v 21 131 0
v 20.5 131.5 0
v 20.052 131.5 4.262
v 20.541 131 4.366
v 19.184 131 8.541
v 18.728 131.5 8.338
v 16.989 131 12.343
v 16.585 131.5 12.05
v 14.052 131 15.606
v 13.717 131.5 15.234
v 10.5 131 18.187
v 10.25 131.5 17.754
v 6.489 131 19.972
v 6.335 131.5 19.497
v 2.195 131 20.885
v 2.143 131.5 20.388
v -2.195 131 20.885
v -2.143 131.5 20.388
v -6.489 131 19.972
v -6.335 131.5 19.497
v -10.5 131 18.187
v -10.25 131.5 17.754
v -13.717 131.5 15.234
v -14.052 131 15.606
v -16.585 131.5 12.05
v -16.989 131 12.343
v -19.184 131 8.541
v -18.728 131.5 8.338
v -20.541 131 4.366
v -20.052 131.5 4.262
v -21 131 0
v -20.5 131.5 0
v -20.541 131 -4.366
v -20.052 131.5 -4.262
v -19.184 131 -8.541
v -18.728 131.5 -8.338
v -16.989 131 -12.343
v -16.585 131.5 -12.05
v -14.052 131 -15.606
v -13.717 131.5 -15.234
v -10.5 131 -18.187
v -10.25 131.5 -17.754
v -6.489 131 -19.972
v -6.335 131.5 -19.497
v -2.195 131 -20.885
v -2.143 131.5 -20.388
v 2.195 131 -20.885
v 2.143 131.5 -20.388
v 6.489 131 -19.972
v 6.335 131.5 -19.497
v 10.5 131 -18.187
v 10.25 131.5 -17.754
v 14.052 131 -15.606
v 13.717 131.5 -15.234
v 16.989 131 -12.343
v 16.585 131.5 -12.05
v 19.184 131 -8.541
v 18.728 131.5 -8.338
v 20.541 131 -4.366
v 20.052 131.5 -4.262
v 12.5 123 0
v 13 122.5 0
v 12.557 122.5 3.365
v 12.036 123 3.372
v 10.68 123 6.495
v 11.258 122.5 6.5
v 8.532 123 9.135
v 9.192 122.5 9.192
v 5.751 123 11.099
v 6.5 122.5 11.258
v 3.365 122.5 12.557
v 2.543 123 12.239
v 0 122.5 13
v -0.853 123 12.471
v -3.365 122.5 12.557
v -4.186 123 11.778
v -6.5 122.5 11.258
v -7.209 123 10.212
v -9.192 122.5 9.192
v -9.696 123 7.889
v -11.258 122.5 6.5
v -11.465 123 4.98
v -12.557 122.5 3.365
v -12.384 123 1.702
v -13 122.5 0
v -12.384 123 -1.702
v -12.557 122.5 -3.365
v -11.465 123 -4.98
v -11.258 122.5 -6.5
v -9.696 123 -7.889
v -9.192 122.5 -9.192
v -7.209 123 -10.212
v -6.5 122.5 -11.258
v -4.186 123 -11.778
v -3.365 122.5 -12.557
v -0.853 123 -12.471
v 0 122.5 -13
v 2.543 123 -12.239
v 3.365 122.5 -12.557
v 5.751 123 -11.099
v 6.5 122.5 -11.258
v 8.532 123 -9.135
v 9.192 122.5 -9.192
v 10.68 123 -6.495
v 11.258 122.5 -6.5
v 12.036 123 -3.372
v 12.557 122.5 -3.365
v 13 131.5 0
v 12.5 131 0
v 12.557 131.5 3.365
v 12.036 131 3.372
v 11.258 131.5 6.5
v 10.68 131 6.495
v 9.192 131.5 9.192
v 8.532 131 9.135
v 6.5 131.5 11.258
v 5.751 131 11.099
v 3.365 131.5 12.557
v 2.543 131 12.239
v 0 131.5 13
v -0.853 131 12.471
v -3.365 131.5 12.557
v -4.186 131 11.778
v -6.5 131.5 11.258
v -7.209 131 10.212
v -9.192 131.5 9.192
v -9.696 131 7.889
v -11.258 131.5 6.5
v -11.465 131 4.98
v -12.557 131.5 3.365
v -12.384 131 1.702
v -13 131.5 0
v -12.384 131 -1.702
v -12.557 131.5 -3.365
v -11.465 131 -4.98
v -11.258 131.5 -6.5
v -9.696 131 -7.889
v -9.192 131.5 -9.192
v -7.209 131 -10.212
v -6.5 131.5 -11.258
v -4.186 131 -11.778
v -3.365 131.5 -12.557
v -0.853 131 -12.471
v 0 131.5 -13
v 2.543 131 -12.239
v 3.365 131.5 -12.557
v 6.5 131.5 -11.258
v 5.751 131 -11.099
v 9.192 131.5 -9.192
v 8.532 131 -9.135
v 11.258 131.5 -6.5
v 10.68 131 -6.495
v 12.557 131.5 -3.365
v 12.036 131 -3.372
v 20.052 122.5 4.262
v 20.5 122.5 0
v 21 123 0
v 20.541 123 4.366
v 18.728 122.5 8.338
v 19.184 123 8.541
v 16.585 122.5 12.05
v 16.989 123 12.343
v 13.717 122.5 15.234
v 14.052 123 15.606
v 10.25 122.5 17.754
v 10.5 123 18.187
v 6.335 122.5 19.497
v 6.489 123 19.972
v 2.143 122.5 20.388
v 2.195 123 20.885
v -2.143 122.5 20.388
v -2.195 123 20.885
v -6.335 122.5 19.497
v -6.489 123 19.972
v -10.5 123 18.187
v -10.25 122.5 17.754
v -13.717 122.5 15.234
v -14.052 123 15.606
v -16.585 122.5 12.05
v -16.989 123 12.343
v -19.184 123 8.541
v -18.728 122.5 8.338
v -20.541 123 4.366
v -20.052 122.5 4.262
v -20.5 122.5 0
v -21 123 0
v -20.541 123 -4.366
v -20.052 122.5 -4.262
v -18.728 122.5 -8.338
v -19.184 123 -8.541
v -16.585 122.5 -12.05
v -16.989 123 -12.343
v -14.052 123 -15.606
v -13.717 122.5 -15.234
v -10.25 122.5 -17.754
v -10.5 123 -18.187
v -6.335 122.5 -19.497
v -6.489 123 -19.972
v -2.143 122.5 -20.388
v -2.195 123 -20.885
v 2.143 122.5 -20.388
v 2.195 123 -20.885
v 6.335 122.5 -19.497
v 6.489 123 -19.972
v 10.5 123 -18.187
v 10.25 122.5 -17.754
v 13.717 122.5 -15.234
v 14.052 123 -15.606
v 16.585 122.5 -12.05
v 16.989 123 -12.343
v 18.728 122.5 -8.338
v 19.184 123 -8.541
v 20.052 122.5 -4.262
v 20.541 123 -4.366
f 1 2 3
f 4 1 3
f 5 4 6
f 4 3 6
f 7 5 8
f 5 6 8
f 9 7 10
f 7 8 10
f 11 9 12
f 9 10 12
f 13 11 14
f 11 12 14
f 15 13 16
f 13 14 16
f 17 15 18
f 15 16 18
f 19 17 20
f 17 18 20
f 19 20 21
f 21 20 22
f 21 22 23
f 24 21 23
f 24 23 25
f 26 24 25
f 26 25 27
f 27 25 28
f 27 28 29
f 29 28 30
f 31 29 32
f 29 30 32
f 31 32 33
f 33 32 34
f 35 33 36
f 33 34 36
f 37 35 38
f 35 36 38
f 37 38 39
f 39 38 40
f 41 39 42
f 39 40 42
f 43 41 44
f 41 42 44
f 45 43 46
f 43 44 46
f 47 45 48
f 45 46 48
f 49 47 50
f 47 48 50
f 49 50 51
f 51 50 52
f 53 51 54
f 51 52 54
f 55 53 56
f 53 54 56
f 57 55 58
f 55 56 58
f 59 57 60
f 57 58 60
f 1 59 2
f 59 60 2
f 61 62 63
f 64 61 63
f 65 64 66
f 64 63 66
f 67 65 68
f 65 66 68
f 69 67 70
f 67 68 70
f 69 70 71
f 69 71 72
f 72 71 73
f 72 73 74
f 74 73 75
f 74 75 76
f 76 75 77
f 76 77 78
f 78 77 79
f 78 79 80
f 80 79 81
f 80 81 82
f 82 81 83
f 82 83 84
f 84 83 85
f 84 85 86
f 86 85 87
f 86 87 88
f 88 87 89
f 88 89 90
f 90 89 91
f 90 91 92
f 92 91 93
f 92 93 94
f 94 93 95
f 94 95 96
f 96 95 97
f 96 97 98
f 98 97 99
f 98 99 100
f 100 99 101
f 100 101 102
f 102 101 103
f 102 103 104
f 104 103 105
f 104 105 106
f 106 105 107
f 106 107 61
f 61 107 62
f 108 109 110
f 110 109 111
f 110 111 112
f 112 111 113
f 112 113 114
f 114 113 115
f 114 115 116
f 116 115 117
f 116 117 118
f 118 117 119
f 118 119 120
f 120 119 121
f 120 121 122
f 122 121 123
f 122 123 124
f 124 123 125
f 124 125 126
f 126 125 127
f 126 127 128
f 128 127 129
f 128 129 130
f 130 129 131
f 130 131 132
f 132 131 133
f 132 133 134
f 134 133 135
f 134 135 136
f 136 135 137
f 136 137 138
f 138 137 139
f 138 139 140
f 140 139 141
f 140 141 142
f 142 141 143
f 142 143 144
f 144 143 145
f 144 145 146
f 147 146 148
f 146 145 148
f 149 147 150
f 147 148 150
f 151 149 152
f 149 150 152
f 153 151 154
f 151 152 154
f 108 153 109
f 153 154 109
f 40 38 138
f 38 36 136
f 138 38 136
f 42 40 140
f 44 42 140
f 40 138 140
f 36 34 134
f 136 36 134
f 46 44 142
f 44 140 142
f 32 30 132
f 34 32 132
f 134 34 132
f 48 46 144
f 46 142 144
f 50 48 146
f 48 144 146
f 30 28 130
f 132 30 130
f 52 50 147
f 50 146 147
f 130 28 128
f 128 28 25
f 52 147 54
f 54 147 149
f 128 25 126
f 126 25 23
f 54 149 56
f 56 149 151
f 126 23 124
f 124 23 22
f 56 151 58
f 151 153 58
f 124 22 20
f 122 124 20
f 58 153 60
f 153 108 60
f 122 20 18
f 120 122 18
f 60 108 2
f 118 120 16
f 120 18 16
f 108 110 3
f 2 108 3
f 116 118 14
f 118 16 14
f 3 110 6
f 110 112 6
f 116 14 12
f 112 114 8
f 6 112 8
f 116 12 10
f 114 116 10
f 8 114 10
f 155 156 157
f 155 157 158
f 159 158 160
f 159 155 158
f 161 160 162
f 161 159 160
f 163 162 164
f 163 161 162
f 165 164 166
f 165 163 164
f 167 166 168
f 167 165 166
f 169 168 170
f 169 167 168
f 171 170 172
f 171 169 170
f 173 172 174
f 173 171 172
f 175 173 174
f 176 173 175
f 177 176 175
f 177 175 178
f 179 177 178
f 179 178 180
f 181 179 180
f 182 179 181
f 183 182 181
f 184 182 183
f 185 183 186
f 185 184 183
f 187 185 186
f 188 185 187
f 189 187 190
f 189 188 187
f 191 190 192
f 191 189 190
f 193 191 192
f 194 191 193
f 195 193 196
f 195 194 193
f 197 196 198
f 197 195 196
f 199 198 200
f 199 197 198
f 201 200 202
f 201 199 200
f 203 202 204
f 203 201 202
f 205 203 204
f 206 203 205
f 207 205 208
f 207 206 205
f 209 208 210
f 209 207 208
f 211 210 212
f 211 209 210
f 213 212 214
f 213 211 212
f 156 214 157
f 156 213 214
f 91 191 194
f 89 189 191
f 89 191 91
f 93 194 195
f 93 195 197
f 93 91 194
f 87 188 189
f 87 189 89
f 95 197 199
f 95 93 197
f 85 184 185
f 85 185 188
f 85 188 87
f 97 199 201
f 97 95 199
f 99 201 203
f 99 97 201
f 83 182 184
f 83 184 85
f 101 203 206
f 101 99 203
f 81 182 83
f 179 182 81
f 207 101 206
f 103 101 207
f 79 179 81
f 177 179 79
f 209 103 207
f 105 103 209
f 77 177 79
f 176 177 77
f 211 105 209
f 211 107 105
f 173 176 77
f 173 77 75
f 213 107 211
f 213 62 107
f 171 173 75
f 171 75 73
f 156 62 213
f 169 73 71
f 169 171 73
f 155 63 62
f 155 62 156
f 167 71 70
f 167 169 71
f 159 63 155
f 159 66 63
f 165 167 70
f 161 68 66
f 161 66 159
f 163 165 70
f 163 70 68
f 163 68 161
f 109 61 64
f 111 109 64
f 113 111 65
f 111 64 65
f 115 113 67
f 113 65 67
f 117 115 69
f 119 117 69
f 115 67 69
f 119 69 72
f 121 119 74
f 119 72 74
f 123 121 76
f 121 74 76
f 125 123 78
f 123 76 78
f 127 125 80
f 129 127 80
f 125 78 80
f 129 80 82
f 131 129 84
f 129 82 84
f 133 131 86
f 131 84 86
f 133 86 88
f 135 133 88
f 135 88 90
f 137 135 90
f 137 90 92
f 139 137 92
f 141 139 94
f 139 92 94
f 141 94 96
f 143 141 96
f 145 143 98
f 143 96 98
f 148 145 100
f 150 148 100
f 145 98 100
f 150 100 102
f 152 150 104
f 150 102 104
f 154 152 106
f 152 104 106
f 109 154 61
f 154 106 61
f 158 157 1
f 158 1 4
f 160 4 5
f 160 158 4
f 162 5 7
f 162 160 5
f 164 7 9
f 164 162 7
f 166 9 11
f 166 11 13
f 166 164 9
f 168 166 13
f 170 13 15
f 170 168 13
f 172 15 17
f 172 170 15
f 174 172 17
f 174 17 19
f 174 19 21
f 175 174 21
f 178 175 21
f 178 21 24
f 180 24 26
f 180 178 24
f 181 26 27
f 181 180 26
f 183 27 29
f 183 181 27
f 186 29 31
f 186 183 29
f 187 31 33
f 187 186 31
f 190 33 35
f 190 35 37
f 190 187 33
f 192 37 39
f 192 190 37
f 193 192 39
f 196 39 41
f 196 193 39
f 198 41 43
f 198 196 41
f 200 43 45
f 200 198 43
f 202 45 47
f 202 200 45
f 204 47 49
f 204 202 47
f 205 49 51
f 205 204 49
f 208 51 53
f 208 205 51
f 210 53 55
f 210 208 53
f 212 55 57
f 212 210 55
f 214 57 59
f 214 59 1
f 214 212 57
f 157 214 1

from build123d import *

# Parameters (mm, degrees)
SKETCH057_R     = 21
SKETCH057_R_2   = 12.5
PAD034_DEPTH    = 9
CHAMFER_SIZE    = 0.5
CHAMFER001_SIZE = 0.5


with BuildPart() as part:
    # Sketch057 → Pad034 (new body)
    with BuildSketch(Plane.XZ.offset(-122.5)):
        Circle(SKETCH057_R)
        Circle(SKETCH057_R_2, mode=Mode.SUBTRACT)
    extrude(amount=-PAD034_DEPTH)

    # Chamfer
    chamfer_edges = [part.edges().sort_by_distance(p)[0] for p in [
        (-21, 122.5, 0),
        (-12.5, 122.5, 0),
    ]]
    chamfer(chamfer_edges, length=CHAMFER_SIZE)

    # Chamfer001
    chamfer001_edges = [part.edges().sort_by_distance(p)[0] for p in [
        (-21, 131.5, 0),
        (-12.5, 131.5, 0),
    ]]
    chamfer(chamfer001_edges, length=CHAMFER001_SIZE)


solid = part.part
